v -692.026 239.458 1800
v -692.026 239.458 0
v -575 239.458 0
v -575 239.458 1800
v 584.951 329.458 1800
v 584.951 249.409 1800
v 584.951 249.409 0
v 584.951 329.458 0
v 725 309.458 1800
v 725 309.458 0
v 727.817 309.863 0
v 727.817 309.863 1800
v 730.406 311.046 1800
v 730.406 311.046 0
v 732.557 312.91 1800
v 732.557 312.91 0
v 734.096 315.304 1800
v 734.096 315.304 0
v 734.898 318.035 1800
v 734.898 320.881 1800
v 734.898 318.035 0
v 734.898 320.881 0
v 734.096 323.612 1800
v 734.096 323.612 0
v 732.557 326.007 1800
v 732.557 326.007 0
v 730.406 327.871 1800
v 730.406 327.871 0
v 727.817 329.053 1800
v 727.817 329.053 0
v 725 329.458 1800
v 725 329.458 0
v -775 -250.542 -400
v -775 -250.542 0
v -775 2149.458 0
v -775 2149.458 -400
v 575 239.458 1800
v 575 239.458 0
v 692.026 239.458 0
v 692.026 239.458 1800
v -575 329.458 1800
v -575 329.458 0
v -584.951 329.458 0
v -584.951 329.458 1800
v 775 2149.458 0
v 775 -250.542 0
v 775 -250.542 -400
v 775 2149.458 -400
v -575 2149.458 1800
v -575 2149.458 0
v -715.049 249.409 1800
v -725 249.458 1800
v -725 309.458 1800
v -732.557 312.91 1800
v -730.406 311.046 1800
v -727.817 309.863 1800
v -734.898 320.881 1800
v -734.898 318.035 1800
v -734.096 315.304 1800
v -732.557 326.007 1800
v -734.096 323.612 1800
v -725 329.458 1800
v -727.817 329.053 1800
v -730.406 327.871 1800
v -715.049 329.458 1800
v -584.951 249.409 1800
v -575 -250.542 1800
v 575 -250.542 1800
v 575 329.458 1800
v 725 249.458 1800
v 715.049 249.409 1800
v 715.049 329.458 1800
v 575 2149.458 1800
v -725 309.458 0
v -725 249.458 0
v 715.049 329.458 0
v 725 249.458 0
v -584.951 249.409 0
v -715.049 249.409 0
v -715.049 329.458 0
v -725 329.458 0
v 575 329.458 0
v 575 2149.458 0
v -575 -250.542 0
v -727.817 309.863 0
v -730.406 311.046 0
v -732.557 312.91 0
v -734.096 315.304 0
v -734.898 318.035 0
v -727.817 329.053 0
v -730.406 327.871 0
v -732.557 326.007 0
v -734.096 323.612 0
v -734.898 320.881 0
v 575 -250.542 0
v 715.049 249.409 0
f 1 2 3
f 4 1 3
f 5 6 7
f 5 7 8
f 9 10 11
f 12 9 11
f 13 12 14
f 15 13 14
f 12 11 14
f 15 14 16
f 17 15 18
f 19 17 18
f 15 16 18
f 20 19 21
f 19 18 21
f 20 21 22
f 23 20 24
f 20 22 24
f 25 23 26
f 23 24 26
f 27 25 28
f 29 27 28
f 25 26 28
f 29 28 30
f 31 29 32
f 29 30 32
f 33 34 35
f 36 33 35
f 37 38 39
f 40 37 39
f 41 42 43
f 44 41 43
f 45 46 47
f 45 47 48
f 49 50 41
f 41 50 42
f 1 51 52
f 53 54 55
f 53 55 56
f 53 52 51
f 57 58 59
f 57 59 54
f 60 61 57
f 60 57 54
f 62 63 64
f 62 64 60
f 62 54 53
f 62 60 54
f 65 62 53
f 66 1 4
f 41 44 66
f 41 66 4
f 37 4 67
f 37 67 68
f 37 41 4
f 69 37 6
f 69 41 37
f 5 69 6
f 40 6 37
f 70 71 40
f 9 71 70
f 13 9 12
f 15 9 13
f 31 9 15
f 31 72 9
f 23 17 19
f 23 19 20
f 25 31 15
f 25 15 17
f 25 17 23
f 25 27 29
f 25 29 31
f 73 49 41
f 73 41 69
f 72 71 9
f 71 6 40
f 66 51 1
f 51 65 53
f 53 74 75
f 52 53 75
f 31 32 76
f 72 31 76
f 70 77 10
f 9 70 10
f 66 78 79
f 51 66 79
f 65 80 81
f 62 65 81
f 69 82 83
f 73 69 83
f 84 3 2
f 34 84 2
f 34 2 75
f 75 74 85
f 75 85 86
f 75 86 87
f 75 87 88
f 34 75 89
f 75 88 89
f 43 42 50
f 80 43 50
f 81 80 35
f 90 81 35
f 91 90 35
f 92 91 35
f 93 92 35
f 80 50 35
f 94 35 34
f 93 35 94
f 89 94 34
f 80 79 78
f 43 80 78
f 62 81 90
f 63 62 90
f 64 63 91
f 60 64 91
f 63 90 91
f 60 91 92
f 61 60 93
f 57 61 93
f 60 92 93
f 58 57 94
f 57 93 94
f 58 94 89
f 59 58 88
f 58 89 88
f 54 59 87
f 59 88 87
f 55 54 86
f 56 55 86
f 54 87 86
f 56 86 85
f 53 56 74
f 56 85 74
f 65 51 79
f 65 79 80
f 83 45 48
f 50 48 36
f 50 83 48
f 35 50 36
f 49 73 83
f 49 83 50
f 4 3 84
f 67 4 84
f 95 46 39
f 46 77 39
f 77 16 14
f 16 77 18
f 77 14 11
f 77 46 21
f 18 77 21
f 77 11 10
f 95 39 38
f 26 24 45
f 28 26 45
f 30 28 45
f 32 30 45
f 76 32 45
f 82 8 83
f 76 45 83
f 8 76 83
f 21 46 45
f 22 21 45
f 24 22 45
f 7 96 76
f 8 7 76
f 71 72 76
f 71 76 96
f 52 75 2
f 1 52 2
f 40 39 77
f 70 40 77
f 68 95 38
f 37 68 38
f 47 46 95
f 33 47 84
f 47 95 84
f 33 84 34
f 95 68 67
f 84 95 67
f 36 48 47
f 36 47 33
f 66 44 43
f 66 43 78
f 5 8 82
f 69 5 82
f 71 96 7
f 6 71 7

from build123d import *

# Parameters (mm, degrees)
EXTRUDE_1_DEPTH = 1800
SKETCH_2_W      = 1550
SKETCH_2_H      = 2400
EXTRUDE_2_DEPTH = 400


with BuildPart() as part:
    # 草圖1 → 填料-伸長1 (new body)
    with BuildSketch(Plane.XY):
        with BuildLine():
            ThreePointArc((-725, 329.458185741), (-735, 319.458185741), (-725, 309.458185741))
            Line((-725, 309.458185741), (-725, 249.458185741))
            Line((-725, 249.458185741), (-692.026095563, 239.458185741))
            Line((-692.026095563, 239.458185741), (-575, 239.458185741))
            Line((-575, 239.458185741), (-575, -250.541814259))
            Line((-575, -250.541814259), (0, -250.541814259))
            Line((0, -250.541814259), (0, 2149.458185741))
            Line((0, 2149.458185741), (-575, 2149.458185741))
            Line((-575, 2149.458185741), (-575, 329.458185741))
            Line((-575, 329.458185741), (-584.95081424, 329.458185741))
            Line((-584.95081424, 329.458185741), (-584.95081424, 249.408999982))
            Line((-584.95081424, 249.408999982), (-715.04918576, 249.408999982))
            Line((-715.04918576, 249.408999982), (-715.04918576, 329.458185741))
            Line((-715.04918576, 329.458185741), (-725, 329.458185741))
        make_face()
        with BuildLine():
            Line((0, 2149.458185741), (0, -250.541814259))
            Line((0, -250.541814259), (575, -250.541814259))
            Line((575, -250.541814259), (575, 239.458185741))
            Line((575, 239.458185741), (692.026095563, 239.458185741))
            Line((692.026095563, 239.458185741), (725, 249.458185741))
            Line((725, 249.458185741), (725, 309.458185741))
            ThreePointArc((725, 309.458185741), (735, 319.458185741), (725, 329.458185741))
            Line((725, 329.458185741), (715.04918576, 329.458185741))
            Line((715.04918576, 329.458185741), (715.04918576, 249.408999982))
            Line((715.04918576, 249.408999982), (584.95081424, 249.408999982))
            Line((584.95081424, 249.408999982), (584.95081424, 329.458185741))
            Line((584.95081424, 329.458185741), (575, 329.458185741))
            Line((575, 329.458185741), (575, 2149.458185741))
            Line((575, 2149.458185741), (0, 2149.458185741))
        make_face()
    extrude(amount=EXTRUDE_1_DEPTH)

    # 草圖2 → 填料-伸長2 (add)
    with BuildSketch(Plane(origin=(0, 0, 0), x_dir=(-1, 0, 0), z_dir=(0, 0, -1))):
        with Locations((0, 949.458185741)):
            Rectangle(SKETCH_2_W, SKETCH_2_H)
    extrude(amount=EXTRUDE_2_DEPTH)


solid = part.part
